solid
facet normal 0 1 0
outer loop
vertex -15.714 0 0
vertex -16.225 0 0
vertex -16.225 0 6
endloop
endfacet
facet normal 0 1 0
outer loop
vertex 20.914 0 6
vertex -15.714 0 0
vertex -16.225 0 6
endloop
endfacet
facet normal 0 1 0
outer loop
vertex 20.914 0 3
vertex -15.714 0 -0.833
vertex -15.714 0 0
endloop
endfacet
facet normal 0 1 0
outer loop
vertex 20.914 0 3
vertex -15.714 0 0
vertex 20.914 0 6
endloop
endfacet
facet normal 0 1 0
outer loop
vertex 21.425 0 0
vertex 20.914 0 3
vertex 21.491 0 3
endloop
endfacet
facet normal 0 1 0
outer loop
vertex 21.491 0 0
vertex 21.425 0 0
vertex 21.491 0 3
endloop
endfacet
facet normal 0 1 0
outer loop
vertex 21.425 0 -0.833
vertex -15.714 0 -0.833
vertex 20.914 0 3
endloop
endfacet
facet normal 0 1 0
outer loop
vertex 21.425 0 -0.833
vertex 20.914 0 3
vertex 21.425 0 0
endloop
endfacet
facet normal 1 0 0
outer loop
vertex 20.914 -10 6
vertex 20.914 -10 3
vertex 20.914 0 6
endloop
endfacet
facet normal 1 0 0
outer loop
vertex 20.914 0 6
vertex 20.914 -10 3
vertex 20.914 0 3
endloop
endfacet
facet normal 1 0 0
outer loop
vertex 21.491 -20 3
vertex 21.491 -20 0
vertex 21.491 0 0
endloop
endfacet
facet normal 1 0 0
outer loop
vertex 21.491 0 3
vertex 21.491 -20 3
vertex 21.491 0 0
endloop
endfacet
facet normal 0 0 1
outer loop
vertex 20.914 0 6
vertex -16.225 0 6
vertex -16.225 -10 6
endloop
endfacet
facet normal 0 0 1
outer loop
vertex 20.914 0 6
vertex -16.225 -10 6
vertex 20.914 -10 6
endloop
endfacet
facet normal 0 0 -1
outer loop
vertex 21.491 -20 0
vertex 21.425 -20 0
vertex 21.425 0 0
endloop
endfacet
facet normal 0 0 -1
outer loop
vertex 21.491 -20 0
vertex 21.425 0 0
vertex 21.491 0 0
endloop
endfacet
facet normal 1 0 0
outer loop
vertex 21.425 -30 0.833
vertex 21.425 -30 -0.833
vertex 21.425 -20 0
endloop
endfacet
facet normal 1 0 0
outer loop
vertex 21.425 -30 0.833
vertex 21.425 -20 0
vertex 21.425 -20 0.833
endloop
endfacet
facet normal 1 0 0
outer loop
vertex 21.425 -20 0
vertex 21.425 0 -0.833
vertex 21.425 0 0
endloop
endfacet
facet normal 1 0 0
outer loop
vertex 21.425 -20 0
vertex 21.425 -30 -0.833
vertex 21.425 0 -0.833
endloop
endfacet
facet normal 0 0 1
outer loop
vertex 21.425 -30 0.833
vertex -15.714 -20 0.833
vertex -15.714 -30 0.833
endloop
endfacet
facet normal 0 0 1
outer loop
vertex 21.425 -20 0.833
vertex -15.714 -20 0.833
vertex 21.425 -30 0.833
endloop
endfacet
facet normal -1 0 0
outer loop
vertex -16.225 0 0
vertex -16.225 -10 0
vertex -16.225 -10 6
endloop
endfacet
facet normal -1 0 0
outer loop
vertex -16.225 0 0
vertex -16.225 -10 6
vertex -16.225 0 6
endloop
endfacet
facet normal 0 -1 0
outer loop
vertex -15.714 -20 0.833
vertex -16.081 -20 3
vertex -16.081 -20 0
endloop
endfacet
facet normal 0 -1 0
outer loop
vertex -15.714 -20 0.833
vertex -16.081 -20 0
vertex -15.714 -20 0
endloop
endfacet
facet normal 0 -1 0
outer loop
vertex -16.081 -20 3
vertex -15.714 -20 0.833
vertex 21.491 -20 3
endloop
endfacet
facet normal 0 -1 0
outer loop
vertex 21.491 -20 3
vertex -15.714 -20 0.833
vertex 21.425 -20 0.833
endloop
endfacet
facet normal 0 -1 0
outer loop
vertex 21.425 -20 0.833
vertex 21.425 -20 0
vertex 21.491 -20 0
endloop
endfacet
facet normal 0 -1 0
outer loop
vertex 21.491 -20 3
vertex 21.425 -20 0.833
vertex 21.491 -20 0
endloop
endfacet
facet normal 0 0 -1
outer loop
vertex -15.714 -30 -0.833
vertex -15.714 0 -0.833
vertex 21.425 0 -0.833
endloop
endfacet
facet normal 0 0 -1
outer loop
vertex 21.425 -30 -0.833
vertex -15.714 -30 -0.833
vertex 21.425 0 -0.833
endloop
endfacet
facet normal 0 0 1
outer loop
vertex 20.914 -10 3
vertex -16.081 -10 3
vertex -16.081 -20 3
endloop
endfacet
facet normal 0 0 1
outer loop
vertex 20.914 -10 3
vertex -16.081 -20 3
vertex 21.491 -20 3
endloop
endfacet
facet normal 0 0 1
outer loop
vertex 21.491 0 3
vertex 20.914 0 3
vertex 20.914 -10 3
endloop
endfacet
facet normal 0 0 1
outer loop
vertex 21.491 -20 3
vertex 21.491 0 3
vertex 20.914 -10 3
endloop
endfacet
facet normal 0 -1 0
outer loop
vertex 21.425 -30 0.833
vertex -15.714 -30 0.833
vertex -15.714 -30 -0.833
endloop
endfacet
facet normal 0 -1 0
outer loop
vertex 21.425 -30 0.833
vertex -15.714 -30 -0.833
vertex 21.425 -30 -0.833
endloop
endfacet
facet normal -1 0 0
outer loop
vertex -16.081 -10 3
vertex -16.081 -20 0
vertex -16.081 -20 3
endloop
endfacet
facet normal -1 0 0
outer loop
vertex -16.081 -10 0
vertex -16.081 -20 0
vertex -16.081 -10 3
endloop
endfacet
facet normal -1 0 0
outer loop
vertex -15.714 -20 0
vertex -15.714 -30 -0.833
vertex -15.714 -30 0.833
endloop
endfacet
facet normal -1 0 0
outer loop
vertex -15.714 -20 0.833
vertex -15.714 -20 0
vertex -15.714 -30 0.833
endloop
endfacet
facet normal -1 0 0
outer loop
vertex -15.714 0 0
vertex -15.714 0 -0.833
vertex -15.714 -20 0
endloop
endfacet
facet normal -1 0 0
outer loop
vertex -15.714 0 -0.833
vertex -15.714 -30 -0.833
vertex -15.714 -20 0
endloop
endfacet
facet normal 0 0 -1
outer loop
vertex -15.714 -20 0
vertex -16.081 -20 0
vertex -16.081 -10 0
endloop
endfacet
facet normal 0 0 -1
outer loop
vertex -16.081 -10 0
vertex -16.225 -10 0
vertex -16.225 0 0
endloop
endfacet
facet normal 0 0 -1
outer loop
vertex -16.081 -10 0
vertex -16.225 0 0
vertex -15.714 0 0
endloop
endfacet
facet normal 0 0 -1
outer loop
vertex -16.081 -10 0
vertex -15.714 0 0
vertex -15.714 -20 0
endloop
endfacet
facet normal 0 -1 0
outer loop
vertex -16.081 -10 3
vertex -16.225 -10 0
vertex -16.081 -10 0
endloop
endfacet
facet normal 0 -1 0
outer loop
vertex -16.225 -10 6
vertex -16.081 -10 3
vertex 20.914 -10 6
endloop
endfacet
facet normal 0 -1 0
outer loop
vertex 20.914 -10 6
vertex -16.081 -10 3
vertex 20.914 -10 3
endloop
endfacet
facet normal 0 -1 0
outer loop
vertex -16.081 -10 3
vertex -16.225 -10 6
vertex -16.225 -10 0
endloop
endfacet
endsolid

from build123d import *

# Parameters (mm, degrees)
F0_W     = 37.13936
F0_H     = 1.666666
F1_DEPTH = 30
F2_W     = 37.571562
F2_H     = 20
F3_DEPTH = 3
F4_W     = 37.139
F4_H     = 10
F5_DEPTH = 6


with BuildPart() as f1:
    # F0 (on Front) → F1 (new body)
    with BuildSketch(Plane.XZ):
        with Locations((2.85544, 0)):
            Rectangle(F0_W, F0_H)
    extrude(amount=F1_DEPTH)

    # F2 (on Top) → F3 (join)
    with BuildSketch(Plane.XY):
        with Locations((2.705152, -10)):
            Rectangle(F2_W, F2_H)
    extrude(amount=F3_DEPTH)

    # F4 (on Top) → F5 (join)
    with BuildSketch(Plane.XY):
        with Locations((2.344745, -5)):
            Rectangle(F4_W, F4_H)
    extrude(amount=F5_DEPTH)


solid = f1.part
